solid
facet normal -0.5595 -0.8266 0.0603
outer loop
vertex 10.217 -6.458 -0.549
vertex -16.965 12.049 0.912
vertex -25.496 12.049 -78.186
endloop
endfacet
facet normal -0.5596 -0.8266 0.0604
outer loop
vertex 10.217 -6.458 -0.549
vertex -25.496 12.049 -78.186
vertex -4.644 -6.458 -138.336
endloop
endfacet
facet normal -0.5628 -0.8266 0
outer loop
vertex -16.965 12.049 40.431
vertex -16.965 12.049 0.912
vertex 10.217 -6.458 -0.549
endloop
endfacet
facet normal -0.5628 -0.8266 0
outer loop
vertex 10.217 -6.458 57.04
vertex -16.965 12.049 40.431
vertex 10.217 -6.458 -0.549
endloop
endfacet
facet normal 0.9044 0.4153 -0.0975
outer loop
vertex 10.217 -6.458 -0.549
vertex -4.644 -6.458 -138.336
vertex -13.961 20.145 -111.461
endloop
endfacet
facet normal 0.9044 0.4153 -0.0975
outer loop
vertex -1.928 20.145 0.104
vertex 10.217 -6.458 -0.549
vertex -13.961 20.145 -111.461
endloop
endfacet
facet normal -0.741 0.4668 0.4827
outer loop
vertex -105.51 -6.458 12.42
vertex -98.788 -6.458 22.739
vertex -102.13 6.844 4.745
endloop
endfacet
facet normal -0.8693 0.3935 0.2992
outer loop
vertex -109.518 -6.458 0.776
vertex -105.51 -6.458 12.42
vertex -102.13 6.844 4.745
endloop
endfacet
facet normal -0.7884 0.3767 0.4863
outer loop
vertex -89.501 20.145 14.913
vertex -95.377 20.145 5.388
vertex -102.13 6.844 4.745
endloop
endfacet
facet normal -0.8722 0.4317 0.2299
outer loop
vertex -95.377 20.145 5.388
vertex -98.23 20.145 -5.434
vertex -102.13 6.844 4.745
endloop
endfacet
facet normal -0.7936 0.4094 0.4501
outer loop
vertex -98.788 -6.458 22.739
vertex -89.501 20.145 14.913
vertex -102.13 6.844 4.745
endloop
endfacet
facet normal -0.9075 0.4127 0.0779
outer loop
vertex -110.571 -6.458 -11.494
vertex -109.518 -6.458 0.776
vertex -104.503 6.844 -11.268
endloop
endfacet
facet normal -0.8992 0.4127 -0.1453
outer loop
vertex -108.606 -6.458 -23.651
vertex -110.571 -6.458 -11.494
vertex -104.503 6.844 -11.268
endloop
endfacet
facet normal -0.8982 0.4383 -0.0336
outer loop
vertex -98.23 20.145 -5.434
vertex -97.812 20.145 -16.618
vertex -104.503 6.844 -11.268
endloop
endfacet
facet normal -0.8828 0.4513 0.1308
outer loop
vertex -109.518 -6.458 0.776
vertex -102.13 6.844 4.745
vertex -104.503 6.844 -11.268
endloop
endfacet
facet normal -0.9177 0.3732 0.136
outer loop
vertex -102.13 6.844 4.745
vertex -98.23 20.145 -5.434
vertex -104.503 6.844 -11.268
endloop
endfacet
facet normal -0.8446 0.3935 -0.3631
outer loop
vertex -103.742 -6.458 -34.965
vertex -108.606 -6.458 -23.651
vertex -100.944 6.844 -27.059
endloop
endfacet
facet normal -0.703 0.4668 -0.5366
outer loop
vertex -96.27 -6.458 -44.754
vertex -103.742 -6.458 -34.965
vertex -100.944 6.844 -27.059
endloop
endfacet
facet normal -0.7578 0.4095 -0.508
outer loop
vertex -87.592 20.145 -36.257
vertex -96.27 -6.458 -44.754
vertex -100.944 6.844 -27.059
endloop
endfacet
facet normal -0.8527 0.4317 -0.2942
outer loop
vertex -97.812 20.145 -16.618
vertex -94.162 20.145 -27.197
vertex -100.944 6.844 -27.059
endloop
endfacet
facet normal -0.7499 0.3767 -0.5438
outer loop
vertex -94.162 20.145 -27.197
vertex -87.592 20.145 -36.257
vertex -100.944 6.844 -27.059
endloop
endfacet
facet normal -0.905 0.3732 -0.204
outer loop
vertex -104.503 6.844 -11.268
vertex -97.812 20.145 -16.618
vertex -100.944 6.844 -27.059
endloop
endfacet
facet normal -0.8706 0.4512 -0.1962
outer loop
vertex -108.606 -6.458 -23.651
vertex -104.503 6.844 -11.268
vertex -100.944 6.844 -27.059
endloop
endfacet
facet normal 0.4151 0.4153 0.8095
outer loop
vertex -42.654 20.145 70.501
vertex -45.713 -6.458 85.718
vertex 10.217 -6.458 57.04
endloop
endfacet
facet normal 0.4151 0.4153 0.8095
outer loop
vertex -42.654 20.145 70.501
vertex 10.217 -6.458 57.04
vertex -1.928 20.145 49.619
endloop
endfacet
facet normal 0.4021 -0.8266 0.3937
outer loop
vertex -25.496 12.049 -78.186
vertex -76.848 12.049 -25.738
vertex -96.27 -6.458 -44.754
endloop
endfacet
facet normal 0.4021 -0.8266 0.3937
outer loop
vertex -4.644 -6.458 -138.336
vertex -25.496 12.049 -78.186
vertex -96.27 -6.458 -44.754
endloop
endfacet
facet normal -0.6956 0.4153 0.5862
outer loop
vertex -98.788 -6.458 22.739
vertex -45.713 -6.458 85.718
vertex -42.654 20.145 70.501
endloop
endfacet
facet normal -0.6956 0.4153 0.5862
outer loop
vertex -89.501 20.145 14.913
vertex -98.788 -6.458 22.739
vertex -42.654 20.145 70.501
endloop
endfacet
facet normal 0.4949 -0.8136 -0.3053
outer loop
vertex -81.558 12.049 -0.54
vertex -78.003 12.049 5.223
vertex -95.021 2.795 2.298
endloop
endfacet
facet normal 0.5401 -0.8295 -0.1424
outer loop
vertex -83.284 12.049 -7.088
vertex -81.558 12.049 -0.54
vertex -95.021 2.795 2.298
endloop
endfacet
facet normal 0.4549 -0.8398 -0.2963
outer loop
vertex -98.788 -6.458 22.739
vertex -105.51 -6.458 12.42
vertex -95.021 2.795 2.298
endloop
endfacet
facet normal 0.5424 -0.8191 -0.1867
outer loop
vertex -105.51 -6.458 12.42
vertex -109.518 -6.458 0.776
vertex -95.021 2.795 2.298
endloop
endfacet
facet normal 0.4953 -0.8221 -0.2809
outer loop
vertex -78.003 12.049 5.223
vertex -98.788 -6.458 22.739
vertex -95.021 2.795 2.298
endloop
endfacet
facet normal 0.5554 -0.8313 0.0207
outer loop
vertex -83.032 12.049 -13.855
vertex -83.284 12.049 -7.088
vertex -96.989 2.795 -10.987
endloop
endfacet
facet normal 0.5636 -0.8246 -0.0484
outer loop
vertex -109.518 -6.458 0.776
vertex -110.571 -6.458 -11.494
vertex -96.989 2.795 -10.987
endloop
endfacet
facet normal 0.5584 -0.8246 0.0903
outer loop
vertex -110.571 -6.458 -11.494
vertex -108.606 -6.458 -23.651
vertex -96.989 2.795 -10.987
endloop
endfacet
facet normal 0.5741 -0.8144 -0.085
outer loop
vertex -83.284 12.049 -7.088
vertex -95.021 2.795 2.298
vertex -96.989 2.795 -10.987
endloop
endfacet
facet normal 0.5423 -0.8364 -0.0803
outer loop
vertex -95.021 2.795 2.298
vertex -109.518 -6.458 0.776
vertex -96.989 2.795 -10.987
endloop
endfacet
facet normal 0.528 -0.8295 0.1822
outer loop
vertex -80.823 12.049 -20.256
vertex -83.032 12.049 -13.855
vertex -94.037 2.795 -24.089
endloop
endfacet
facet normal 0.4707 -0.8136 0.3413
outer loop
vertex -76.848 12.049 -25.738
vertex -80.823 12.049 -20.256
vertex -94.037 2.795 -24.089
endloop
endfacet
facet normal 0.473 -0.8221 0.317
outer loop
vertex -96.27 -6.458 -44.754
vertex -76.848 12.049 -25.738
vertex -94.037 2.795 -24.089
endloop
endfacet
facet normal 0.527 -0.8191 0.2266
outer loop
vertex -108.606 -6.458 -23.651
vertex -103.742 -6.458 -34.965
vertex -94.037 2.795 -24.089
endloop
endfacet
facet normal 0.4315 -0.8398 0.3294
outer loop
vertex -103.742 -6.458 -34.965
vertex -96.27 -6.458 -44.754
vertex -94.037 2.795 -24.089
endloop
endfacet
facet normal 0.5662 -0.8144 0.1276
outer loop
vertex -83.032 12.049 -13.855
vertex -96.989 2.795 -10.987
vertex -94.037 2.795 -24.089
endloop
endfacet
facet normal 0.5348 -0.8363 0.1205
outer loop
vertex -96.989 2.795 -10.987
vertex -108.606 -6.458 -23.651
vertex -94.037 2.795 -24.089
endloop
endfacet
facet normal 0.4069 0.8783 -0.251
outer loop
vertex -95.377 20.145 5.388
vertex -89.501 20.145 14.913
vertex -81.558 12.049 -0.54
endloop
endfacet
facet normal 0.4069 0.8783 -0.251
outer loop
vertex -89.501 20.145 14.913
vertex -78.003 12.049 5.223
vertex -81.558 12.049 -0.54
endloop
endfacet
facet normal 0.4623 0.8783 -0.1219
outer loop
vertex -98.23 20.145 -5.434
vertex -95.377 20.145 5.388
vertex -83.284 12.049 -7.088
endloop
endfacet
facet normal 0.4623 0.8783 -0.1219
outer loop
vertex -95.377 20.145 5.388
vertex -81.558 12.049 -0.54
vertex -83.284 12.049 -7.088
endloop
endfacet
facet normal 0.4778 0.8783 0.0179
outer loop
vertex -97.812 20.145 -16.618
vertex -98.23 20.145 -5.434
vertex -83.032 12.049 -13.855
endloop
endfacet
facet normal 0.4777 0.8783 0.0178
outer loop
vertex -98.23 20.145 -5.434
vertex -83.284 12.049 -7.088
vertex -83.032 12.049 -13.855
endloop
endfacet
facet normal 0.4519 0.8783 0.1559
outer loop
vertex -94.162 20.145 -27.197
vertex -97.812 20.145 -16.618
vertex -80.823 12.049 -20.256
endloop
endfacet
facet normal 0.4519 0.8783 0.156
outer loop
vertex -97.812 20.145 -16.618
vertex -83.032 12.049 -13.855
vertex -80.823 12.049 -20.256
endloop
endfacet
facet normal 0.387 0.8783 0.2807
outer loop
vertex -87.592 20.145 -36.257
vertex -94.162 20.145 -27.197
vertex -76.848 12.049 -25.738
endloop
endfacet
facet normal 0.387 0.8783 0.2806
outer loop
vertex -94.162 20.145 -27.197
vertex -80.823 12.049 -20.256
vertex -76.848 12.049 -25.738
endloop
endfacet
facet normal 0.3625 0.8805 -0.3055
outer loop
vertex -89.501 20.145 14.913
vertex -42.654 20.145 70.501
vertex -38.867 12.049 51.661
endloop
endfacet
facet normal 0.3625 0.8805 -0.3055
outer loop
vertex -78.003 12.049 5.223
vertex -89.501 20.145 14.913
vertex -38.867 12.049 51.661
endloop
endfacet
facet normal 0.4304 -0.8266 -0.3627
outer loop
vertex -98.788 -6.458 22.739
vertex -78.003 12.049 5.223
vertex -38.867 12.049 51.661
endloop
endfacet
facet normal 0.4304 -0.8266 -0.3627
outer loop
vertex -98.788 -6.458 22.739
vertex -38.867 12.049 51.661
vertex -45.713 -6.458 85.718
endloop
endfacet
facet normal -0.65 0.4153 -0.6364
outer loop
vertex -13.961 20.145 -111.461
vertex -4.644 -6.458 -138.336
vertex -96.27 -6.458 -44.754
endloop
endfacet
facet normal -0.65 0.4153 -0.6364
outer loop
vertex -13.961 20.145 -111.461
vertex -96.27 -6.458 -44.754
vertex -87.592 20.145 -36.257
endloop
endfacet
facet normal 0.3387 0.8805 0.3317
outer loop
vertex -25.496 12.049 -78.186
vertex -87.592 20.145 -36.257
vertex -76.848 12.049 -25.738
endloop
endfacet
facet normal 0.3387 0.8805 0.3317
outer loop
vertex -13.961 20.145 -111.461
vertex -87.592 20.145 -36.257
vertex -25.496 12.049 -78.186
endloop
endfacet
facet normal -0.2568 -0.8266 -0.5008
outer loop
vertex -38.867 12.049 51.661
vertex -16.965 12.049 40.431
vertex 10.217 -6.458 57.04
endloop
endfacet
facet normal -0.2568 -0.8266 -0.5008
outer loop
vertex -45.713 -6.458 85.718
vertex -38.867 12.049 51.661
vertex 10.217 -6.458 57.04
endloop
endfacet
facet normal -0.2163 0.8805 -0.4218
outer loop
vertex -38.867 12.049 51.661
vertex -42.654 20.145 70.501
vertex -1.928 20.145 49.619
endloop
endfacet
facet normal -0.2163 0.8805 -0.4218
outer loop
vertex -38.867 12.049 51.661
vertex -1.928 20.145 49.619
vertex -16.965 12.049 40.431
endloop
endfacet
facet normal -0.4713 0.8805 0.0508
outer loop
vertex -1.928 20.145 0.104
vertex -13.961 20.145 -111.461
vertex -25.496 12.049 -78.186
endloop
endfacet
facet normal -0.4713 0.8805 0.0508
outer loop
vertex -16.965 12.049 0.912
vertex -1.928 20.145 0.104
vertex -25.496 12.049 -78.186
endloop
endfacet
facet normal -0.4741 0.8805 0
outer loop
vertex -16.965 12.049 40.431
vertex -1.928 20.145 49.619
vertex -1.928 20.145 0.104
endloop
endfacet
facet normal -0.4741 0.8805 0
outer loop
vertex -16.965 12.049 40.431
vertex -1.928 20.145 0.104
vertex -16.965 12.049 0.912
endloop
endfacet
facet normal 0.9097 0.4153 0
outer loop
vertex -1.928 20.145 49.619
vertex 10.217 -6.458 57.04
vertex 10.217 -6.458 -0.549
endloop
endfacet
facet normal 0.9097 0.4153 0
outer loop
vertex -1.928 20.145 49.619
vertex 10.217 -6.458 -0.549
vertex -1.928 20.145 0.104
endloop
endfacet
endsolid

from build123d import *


with BuildPart() as f2:
    # F2: sweep along a path in F1
    with BuildLine(Plane.XZ) as f2_path:
        Line((0, 0), (0, 50.7971271873))
        Line((0, 50.7971271873), (-43.1399196386, 72.9165449739))
        Line((-43.1399196386, 72.9165449739), (-90.9753785277, 16.1548483209))
        ThreePointArc((-90.9753785277, 16.1548483209), (-100.3607226238, -11.1131320772), (-88.9698324182, -37.6060567764))
        Line((-88.9698324182, -37.6060567764), (-12.4816746493, -115.7265843466))
        Line((-12.4816746493, -115.7265843466), (0, 0))
    # F0 (on Top) → F2 (sweep)
    with BuildSketch(Plane.XY):
        Polygon((10.2172587067, -6.4580785111), (-1.9277846441, 20.1453492045), (-16.9645044953, 12.0486542583), align=None)
    sweep(path=f2_path.line, transition=Transition.RIGHT)


solid = f2.part
